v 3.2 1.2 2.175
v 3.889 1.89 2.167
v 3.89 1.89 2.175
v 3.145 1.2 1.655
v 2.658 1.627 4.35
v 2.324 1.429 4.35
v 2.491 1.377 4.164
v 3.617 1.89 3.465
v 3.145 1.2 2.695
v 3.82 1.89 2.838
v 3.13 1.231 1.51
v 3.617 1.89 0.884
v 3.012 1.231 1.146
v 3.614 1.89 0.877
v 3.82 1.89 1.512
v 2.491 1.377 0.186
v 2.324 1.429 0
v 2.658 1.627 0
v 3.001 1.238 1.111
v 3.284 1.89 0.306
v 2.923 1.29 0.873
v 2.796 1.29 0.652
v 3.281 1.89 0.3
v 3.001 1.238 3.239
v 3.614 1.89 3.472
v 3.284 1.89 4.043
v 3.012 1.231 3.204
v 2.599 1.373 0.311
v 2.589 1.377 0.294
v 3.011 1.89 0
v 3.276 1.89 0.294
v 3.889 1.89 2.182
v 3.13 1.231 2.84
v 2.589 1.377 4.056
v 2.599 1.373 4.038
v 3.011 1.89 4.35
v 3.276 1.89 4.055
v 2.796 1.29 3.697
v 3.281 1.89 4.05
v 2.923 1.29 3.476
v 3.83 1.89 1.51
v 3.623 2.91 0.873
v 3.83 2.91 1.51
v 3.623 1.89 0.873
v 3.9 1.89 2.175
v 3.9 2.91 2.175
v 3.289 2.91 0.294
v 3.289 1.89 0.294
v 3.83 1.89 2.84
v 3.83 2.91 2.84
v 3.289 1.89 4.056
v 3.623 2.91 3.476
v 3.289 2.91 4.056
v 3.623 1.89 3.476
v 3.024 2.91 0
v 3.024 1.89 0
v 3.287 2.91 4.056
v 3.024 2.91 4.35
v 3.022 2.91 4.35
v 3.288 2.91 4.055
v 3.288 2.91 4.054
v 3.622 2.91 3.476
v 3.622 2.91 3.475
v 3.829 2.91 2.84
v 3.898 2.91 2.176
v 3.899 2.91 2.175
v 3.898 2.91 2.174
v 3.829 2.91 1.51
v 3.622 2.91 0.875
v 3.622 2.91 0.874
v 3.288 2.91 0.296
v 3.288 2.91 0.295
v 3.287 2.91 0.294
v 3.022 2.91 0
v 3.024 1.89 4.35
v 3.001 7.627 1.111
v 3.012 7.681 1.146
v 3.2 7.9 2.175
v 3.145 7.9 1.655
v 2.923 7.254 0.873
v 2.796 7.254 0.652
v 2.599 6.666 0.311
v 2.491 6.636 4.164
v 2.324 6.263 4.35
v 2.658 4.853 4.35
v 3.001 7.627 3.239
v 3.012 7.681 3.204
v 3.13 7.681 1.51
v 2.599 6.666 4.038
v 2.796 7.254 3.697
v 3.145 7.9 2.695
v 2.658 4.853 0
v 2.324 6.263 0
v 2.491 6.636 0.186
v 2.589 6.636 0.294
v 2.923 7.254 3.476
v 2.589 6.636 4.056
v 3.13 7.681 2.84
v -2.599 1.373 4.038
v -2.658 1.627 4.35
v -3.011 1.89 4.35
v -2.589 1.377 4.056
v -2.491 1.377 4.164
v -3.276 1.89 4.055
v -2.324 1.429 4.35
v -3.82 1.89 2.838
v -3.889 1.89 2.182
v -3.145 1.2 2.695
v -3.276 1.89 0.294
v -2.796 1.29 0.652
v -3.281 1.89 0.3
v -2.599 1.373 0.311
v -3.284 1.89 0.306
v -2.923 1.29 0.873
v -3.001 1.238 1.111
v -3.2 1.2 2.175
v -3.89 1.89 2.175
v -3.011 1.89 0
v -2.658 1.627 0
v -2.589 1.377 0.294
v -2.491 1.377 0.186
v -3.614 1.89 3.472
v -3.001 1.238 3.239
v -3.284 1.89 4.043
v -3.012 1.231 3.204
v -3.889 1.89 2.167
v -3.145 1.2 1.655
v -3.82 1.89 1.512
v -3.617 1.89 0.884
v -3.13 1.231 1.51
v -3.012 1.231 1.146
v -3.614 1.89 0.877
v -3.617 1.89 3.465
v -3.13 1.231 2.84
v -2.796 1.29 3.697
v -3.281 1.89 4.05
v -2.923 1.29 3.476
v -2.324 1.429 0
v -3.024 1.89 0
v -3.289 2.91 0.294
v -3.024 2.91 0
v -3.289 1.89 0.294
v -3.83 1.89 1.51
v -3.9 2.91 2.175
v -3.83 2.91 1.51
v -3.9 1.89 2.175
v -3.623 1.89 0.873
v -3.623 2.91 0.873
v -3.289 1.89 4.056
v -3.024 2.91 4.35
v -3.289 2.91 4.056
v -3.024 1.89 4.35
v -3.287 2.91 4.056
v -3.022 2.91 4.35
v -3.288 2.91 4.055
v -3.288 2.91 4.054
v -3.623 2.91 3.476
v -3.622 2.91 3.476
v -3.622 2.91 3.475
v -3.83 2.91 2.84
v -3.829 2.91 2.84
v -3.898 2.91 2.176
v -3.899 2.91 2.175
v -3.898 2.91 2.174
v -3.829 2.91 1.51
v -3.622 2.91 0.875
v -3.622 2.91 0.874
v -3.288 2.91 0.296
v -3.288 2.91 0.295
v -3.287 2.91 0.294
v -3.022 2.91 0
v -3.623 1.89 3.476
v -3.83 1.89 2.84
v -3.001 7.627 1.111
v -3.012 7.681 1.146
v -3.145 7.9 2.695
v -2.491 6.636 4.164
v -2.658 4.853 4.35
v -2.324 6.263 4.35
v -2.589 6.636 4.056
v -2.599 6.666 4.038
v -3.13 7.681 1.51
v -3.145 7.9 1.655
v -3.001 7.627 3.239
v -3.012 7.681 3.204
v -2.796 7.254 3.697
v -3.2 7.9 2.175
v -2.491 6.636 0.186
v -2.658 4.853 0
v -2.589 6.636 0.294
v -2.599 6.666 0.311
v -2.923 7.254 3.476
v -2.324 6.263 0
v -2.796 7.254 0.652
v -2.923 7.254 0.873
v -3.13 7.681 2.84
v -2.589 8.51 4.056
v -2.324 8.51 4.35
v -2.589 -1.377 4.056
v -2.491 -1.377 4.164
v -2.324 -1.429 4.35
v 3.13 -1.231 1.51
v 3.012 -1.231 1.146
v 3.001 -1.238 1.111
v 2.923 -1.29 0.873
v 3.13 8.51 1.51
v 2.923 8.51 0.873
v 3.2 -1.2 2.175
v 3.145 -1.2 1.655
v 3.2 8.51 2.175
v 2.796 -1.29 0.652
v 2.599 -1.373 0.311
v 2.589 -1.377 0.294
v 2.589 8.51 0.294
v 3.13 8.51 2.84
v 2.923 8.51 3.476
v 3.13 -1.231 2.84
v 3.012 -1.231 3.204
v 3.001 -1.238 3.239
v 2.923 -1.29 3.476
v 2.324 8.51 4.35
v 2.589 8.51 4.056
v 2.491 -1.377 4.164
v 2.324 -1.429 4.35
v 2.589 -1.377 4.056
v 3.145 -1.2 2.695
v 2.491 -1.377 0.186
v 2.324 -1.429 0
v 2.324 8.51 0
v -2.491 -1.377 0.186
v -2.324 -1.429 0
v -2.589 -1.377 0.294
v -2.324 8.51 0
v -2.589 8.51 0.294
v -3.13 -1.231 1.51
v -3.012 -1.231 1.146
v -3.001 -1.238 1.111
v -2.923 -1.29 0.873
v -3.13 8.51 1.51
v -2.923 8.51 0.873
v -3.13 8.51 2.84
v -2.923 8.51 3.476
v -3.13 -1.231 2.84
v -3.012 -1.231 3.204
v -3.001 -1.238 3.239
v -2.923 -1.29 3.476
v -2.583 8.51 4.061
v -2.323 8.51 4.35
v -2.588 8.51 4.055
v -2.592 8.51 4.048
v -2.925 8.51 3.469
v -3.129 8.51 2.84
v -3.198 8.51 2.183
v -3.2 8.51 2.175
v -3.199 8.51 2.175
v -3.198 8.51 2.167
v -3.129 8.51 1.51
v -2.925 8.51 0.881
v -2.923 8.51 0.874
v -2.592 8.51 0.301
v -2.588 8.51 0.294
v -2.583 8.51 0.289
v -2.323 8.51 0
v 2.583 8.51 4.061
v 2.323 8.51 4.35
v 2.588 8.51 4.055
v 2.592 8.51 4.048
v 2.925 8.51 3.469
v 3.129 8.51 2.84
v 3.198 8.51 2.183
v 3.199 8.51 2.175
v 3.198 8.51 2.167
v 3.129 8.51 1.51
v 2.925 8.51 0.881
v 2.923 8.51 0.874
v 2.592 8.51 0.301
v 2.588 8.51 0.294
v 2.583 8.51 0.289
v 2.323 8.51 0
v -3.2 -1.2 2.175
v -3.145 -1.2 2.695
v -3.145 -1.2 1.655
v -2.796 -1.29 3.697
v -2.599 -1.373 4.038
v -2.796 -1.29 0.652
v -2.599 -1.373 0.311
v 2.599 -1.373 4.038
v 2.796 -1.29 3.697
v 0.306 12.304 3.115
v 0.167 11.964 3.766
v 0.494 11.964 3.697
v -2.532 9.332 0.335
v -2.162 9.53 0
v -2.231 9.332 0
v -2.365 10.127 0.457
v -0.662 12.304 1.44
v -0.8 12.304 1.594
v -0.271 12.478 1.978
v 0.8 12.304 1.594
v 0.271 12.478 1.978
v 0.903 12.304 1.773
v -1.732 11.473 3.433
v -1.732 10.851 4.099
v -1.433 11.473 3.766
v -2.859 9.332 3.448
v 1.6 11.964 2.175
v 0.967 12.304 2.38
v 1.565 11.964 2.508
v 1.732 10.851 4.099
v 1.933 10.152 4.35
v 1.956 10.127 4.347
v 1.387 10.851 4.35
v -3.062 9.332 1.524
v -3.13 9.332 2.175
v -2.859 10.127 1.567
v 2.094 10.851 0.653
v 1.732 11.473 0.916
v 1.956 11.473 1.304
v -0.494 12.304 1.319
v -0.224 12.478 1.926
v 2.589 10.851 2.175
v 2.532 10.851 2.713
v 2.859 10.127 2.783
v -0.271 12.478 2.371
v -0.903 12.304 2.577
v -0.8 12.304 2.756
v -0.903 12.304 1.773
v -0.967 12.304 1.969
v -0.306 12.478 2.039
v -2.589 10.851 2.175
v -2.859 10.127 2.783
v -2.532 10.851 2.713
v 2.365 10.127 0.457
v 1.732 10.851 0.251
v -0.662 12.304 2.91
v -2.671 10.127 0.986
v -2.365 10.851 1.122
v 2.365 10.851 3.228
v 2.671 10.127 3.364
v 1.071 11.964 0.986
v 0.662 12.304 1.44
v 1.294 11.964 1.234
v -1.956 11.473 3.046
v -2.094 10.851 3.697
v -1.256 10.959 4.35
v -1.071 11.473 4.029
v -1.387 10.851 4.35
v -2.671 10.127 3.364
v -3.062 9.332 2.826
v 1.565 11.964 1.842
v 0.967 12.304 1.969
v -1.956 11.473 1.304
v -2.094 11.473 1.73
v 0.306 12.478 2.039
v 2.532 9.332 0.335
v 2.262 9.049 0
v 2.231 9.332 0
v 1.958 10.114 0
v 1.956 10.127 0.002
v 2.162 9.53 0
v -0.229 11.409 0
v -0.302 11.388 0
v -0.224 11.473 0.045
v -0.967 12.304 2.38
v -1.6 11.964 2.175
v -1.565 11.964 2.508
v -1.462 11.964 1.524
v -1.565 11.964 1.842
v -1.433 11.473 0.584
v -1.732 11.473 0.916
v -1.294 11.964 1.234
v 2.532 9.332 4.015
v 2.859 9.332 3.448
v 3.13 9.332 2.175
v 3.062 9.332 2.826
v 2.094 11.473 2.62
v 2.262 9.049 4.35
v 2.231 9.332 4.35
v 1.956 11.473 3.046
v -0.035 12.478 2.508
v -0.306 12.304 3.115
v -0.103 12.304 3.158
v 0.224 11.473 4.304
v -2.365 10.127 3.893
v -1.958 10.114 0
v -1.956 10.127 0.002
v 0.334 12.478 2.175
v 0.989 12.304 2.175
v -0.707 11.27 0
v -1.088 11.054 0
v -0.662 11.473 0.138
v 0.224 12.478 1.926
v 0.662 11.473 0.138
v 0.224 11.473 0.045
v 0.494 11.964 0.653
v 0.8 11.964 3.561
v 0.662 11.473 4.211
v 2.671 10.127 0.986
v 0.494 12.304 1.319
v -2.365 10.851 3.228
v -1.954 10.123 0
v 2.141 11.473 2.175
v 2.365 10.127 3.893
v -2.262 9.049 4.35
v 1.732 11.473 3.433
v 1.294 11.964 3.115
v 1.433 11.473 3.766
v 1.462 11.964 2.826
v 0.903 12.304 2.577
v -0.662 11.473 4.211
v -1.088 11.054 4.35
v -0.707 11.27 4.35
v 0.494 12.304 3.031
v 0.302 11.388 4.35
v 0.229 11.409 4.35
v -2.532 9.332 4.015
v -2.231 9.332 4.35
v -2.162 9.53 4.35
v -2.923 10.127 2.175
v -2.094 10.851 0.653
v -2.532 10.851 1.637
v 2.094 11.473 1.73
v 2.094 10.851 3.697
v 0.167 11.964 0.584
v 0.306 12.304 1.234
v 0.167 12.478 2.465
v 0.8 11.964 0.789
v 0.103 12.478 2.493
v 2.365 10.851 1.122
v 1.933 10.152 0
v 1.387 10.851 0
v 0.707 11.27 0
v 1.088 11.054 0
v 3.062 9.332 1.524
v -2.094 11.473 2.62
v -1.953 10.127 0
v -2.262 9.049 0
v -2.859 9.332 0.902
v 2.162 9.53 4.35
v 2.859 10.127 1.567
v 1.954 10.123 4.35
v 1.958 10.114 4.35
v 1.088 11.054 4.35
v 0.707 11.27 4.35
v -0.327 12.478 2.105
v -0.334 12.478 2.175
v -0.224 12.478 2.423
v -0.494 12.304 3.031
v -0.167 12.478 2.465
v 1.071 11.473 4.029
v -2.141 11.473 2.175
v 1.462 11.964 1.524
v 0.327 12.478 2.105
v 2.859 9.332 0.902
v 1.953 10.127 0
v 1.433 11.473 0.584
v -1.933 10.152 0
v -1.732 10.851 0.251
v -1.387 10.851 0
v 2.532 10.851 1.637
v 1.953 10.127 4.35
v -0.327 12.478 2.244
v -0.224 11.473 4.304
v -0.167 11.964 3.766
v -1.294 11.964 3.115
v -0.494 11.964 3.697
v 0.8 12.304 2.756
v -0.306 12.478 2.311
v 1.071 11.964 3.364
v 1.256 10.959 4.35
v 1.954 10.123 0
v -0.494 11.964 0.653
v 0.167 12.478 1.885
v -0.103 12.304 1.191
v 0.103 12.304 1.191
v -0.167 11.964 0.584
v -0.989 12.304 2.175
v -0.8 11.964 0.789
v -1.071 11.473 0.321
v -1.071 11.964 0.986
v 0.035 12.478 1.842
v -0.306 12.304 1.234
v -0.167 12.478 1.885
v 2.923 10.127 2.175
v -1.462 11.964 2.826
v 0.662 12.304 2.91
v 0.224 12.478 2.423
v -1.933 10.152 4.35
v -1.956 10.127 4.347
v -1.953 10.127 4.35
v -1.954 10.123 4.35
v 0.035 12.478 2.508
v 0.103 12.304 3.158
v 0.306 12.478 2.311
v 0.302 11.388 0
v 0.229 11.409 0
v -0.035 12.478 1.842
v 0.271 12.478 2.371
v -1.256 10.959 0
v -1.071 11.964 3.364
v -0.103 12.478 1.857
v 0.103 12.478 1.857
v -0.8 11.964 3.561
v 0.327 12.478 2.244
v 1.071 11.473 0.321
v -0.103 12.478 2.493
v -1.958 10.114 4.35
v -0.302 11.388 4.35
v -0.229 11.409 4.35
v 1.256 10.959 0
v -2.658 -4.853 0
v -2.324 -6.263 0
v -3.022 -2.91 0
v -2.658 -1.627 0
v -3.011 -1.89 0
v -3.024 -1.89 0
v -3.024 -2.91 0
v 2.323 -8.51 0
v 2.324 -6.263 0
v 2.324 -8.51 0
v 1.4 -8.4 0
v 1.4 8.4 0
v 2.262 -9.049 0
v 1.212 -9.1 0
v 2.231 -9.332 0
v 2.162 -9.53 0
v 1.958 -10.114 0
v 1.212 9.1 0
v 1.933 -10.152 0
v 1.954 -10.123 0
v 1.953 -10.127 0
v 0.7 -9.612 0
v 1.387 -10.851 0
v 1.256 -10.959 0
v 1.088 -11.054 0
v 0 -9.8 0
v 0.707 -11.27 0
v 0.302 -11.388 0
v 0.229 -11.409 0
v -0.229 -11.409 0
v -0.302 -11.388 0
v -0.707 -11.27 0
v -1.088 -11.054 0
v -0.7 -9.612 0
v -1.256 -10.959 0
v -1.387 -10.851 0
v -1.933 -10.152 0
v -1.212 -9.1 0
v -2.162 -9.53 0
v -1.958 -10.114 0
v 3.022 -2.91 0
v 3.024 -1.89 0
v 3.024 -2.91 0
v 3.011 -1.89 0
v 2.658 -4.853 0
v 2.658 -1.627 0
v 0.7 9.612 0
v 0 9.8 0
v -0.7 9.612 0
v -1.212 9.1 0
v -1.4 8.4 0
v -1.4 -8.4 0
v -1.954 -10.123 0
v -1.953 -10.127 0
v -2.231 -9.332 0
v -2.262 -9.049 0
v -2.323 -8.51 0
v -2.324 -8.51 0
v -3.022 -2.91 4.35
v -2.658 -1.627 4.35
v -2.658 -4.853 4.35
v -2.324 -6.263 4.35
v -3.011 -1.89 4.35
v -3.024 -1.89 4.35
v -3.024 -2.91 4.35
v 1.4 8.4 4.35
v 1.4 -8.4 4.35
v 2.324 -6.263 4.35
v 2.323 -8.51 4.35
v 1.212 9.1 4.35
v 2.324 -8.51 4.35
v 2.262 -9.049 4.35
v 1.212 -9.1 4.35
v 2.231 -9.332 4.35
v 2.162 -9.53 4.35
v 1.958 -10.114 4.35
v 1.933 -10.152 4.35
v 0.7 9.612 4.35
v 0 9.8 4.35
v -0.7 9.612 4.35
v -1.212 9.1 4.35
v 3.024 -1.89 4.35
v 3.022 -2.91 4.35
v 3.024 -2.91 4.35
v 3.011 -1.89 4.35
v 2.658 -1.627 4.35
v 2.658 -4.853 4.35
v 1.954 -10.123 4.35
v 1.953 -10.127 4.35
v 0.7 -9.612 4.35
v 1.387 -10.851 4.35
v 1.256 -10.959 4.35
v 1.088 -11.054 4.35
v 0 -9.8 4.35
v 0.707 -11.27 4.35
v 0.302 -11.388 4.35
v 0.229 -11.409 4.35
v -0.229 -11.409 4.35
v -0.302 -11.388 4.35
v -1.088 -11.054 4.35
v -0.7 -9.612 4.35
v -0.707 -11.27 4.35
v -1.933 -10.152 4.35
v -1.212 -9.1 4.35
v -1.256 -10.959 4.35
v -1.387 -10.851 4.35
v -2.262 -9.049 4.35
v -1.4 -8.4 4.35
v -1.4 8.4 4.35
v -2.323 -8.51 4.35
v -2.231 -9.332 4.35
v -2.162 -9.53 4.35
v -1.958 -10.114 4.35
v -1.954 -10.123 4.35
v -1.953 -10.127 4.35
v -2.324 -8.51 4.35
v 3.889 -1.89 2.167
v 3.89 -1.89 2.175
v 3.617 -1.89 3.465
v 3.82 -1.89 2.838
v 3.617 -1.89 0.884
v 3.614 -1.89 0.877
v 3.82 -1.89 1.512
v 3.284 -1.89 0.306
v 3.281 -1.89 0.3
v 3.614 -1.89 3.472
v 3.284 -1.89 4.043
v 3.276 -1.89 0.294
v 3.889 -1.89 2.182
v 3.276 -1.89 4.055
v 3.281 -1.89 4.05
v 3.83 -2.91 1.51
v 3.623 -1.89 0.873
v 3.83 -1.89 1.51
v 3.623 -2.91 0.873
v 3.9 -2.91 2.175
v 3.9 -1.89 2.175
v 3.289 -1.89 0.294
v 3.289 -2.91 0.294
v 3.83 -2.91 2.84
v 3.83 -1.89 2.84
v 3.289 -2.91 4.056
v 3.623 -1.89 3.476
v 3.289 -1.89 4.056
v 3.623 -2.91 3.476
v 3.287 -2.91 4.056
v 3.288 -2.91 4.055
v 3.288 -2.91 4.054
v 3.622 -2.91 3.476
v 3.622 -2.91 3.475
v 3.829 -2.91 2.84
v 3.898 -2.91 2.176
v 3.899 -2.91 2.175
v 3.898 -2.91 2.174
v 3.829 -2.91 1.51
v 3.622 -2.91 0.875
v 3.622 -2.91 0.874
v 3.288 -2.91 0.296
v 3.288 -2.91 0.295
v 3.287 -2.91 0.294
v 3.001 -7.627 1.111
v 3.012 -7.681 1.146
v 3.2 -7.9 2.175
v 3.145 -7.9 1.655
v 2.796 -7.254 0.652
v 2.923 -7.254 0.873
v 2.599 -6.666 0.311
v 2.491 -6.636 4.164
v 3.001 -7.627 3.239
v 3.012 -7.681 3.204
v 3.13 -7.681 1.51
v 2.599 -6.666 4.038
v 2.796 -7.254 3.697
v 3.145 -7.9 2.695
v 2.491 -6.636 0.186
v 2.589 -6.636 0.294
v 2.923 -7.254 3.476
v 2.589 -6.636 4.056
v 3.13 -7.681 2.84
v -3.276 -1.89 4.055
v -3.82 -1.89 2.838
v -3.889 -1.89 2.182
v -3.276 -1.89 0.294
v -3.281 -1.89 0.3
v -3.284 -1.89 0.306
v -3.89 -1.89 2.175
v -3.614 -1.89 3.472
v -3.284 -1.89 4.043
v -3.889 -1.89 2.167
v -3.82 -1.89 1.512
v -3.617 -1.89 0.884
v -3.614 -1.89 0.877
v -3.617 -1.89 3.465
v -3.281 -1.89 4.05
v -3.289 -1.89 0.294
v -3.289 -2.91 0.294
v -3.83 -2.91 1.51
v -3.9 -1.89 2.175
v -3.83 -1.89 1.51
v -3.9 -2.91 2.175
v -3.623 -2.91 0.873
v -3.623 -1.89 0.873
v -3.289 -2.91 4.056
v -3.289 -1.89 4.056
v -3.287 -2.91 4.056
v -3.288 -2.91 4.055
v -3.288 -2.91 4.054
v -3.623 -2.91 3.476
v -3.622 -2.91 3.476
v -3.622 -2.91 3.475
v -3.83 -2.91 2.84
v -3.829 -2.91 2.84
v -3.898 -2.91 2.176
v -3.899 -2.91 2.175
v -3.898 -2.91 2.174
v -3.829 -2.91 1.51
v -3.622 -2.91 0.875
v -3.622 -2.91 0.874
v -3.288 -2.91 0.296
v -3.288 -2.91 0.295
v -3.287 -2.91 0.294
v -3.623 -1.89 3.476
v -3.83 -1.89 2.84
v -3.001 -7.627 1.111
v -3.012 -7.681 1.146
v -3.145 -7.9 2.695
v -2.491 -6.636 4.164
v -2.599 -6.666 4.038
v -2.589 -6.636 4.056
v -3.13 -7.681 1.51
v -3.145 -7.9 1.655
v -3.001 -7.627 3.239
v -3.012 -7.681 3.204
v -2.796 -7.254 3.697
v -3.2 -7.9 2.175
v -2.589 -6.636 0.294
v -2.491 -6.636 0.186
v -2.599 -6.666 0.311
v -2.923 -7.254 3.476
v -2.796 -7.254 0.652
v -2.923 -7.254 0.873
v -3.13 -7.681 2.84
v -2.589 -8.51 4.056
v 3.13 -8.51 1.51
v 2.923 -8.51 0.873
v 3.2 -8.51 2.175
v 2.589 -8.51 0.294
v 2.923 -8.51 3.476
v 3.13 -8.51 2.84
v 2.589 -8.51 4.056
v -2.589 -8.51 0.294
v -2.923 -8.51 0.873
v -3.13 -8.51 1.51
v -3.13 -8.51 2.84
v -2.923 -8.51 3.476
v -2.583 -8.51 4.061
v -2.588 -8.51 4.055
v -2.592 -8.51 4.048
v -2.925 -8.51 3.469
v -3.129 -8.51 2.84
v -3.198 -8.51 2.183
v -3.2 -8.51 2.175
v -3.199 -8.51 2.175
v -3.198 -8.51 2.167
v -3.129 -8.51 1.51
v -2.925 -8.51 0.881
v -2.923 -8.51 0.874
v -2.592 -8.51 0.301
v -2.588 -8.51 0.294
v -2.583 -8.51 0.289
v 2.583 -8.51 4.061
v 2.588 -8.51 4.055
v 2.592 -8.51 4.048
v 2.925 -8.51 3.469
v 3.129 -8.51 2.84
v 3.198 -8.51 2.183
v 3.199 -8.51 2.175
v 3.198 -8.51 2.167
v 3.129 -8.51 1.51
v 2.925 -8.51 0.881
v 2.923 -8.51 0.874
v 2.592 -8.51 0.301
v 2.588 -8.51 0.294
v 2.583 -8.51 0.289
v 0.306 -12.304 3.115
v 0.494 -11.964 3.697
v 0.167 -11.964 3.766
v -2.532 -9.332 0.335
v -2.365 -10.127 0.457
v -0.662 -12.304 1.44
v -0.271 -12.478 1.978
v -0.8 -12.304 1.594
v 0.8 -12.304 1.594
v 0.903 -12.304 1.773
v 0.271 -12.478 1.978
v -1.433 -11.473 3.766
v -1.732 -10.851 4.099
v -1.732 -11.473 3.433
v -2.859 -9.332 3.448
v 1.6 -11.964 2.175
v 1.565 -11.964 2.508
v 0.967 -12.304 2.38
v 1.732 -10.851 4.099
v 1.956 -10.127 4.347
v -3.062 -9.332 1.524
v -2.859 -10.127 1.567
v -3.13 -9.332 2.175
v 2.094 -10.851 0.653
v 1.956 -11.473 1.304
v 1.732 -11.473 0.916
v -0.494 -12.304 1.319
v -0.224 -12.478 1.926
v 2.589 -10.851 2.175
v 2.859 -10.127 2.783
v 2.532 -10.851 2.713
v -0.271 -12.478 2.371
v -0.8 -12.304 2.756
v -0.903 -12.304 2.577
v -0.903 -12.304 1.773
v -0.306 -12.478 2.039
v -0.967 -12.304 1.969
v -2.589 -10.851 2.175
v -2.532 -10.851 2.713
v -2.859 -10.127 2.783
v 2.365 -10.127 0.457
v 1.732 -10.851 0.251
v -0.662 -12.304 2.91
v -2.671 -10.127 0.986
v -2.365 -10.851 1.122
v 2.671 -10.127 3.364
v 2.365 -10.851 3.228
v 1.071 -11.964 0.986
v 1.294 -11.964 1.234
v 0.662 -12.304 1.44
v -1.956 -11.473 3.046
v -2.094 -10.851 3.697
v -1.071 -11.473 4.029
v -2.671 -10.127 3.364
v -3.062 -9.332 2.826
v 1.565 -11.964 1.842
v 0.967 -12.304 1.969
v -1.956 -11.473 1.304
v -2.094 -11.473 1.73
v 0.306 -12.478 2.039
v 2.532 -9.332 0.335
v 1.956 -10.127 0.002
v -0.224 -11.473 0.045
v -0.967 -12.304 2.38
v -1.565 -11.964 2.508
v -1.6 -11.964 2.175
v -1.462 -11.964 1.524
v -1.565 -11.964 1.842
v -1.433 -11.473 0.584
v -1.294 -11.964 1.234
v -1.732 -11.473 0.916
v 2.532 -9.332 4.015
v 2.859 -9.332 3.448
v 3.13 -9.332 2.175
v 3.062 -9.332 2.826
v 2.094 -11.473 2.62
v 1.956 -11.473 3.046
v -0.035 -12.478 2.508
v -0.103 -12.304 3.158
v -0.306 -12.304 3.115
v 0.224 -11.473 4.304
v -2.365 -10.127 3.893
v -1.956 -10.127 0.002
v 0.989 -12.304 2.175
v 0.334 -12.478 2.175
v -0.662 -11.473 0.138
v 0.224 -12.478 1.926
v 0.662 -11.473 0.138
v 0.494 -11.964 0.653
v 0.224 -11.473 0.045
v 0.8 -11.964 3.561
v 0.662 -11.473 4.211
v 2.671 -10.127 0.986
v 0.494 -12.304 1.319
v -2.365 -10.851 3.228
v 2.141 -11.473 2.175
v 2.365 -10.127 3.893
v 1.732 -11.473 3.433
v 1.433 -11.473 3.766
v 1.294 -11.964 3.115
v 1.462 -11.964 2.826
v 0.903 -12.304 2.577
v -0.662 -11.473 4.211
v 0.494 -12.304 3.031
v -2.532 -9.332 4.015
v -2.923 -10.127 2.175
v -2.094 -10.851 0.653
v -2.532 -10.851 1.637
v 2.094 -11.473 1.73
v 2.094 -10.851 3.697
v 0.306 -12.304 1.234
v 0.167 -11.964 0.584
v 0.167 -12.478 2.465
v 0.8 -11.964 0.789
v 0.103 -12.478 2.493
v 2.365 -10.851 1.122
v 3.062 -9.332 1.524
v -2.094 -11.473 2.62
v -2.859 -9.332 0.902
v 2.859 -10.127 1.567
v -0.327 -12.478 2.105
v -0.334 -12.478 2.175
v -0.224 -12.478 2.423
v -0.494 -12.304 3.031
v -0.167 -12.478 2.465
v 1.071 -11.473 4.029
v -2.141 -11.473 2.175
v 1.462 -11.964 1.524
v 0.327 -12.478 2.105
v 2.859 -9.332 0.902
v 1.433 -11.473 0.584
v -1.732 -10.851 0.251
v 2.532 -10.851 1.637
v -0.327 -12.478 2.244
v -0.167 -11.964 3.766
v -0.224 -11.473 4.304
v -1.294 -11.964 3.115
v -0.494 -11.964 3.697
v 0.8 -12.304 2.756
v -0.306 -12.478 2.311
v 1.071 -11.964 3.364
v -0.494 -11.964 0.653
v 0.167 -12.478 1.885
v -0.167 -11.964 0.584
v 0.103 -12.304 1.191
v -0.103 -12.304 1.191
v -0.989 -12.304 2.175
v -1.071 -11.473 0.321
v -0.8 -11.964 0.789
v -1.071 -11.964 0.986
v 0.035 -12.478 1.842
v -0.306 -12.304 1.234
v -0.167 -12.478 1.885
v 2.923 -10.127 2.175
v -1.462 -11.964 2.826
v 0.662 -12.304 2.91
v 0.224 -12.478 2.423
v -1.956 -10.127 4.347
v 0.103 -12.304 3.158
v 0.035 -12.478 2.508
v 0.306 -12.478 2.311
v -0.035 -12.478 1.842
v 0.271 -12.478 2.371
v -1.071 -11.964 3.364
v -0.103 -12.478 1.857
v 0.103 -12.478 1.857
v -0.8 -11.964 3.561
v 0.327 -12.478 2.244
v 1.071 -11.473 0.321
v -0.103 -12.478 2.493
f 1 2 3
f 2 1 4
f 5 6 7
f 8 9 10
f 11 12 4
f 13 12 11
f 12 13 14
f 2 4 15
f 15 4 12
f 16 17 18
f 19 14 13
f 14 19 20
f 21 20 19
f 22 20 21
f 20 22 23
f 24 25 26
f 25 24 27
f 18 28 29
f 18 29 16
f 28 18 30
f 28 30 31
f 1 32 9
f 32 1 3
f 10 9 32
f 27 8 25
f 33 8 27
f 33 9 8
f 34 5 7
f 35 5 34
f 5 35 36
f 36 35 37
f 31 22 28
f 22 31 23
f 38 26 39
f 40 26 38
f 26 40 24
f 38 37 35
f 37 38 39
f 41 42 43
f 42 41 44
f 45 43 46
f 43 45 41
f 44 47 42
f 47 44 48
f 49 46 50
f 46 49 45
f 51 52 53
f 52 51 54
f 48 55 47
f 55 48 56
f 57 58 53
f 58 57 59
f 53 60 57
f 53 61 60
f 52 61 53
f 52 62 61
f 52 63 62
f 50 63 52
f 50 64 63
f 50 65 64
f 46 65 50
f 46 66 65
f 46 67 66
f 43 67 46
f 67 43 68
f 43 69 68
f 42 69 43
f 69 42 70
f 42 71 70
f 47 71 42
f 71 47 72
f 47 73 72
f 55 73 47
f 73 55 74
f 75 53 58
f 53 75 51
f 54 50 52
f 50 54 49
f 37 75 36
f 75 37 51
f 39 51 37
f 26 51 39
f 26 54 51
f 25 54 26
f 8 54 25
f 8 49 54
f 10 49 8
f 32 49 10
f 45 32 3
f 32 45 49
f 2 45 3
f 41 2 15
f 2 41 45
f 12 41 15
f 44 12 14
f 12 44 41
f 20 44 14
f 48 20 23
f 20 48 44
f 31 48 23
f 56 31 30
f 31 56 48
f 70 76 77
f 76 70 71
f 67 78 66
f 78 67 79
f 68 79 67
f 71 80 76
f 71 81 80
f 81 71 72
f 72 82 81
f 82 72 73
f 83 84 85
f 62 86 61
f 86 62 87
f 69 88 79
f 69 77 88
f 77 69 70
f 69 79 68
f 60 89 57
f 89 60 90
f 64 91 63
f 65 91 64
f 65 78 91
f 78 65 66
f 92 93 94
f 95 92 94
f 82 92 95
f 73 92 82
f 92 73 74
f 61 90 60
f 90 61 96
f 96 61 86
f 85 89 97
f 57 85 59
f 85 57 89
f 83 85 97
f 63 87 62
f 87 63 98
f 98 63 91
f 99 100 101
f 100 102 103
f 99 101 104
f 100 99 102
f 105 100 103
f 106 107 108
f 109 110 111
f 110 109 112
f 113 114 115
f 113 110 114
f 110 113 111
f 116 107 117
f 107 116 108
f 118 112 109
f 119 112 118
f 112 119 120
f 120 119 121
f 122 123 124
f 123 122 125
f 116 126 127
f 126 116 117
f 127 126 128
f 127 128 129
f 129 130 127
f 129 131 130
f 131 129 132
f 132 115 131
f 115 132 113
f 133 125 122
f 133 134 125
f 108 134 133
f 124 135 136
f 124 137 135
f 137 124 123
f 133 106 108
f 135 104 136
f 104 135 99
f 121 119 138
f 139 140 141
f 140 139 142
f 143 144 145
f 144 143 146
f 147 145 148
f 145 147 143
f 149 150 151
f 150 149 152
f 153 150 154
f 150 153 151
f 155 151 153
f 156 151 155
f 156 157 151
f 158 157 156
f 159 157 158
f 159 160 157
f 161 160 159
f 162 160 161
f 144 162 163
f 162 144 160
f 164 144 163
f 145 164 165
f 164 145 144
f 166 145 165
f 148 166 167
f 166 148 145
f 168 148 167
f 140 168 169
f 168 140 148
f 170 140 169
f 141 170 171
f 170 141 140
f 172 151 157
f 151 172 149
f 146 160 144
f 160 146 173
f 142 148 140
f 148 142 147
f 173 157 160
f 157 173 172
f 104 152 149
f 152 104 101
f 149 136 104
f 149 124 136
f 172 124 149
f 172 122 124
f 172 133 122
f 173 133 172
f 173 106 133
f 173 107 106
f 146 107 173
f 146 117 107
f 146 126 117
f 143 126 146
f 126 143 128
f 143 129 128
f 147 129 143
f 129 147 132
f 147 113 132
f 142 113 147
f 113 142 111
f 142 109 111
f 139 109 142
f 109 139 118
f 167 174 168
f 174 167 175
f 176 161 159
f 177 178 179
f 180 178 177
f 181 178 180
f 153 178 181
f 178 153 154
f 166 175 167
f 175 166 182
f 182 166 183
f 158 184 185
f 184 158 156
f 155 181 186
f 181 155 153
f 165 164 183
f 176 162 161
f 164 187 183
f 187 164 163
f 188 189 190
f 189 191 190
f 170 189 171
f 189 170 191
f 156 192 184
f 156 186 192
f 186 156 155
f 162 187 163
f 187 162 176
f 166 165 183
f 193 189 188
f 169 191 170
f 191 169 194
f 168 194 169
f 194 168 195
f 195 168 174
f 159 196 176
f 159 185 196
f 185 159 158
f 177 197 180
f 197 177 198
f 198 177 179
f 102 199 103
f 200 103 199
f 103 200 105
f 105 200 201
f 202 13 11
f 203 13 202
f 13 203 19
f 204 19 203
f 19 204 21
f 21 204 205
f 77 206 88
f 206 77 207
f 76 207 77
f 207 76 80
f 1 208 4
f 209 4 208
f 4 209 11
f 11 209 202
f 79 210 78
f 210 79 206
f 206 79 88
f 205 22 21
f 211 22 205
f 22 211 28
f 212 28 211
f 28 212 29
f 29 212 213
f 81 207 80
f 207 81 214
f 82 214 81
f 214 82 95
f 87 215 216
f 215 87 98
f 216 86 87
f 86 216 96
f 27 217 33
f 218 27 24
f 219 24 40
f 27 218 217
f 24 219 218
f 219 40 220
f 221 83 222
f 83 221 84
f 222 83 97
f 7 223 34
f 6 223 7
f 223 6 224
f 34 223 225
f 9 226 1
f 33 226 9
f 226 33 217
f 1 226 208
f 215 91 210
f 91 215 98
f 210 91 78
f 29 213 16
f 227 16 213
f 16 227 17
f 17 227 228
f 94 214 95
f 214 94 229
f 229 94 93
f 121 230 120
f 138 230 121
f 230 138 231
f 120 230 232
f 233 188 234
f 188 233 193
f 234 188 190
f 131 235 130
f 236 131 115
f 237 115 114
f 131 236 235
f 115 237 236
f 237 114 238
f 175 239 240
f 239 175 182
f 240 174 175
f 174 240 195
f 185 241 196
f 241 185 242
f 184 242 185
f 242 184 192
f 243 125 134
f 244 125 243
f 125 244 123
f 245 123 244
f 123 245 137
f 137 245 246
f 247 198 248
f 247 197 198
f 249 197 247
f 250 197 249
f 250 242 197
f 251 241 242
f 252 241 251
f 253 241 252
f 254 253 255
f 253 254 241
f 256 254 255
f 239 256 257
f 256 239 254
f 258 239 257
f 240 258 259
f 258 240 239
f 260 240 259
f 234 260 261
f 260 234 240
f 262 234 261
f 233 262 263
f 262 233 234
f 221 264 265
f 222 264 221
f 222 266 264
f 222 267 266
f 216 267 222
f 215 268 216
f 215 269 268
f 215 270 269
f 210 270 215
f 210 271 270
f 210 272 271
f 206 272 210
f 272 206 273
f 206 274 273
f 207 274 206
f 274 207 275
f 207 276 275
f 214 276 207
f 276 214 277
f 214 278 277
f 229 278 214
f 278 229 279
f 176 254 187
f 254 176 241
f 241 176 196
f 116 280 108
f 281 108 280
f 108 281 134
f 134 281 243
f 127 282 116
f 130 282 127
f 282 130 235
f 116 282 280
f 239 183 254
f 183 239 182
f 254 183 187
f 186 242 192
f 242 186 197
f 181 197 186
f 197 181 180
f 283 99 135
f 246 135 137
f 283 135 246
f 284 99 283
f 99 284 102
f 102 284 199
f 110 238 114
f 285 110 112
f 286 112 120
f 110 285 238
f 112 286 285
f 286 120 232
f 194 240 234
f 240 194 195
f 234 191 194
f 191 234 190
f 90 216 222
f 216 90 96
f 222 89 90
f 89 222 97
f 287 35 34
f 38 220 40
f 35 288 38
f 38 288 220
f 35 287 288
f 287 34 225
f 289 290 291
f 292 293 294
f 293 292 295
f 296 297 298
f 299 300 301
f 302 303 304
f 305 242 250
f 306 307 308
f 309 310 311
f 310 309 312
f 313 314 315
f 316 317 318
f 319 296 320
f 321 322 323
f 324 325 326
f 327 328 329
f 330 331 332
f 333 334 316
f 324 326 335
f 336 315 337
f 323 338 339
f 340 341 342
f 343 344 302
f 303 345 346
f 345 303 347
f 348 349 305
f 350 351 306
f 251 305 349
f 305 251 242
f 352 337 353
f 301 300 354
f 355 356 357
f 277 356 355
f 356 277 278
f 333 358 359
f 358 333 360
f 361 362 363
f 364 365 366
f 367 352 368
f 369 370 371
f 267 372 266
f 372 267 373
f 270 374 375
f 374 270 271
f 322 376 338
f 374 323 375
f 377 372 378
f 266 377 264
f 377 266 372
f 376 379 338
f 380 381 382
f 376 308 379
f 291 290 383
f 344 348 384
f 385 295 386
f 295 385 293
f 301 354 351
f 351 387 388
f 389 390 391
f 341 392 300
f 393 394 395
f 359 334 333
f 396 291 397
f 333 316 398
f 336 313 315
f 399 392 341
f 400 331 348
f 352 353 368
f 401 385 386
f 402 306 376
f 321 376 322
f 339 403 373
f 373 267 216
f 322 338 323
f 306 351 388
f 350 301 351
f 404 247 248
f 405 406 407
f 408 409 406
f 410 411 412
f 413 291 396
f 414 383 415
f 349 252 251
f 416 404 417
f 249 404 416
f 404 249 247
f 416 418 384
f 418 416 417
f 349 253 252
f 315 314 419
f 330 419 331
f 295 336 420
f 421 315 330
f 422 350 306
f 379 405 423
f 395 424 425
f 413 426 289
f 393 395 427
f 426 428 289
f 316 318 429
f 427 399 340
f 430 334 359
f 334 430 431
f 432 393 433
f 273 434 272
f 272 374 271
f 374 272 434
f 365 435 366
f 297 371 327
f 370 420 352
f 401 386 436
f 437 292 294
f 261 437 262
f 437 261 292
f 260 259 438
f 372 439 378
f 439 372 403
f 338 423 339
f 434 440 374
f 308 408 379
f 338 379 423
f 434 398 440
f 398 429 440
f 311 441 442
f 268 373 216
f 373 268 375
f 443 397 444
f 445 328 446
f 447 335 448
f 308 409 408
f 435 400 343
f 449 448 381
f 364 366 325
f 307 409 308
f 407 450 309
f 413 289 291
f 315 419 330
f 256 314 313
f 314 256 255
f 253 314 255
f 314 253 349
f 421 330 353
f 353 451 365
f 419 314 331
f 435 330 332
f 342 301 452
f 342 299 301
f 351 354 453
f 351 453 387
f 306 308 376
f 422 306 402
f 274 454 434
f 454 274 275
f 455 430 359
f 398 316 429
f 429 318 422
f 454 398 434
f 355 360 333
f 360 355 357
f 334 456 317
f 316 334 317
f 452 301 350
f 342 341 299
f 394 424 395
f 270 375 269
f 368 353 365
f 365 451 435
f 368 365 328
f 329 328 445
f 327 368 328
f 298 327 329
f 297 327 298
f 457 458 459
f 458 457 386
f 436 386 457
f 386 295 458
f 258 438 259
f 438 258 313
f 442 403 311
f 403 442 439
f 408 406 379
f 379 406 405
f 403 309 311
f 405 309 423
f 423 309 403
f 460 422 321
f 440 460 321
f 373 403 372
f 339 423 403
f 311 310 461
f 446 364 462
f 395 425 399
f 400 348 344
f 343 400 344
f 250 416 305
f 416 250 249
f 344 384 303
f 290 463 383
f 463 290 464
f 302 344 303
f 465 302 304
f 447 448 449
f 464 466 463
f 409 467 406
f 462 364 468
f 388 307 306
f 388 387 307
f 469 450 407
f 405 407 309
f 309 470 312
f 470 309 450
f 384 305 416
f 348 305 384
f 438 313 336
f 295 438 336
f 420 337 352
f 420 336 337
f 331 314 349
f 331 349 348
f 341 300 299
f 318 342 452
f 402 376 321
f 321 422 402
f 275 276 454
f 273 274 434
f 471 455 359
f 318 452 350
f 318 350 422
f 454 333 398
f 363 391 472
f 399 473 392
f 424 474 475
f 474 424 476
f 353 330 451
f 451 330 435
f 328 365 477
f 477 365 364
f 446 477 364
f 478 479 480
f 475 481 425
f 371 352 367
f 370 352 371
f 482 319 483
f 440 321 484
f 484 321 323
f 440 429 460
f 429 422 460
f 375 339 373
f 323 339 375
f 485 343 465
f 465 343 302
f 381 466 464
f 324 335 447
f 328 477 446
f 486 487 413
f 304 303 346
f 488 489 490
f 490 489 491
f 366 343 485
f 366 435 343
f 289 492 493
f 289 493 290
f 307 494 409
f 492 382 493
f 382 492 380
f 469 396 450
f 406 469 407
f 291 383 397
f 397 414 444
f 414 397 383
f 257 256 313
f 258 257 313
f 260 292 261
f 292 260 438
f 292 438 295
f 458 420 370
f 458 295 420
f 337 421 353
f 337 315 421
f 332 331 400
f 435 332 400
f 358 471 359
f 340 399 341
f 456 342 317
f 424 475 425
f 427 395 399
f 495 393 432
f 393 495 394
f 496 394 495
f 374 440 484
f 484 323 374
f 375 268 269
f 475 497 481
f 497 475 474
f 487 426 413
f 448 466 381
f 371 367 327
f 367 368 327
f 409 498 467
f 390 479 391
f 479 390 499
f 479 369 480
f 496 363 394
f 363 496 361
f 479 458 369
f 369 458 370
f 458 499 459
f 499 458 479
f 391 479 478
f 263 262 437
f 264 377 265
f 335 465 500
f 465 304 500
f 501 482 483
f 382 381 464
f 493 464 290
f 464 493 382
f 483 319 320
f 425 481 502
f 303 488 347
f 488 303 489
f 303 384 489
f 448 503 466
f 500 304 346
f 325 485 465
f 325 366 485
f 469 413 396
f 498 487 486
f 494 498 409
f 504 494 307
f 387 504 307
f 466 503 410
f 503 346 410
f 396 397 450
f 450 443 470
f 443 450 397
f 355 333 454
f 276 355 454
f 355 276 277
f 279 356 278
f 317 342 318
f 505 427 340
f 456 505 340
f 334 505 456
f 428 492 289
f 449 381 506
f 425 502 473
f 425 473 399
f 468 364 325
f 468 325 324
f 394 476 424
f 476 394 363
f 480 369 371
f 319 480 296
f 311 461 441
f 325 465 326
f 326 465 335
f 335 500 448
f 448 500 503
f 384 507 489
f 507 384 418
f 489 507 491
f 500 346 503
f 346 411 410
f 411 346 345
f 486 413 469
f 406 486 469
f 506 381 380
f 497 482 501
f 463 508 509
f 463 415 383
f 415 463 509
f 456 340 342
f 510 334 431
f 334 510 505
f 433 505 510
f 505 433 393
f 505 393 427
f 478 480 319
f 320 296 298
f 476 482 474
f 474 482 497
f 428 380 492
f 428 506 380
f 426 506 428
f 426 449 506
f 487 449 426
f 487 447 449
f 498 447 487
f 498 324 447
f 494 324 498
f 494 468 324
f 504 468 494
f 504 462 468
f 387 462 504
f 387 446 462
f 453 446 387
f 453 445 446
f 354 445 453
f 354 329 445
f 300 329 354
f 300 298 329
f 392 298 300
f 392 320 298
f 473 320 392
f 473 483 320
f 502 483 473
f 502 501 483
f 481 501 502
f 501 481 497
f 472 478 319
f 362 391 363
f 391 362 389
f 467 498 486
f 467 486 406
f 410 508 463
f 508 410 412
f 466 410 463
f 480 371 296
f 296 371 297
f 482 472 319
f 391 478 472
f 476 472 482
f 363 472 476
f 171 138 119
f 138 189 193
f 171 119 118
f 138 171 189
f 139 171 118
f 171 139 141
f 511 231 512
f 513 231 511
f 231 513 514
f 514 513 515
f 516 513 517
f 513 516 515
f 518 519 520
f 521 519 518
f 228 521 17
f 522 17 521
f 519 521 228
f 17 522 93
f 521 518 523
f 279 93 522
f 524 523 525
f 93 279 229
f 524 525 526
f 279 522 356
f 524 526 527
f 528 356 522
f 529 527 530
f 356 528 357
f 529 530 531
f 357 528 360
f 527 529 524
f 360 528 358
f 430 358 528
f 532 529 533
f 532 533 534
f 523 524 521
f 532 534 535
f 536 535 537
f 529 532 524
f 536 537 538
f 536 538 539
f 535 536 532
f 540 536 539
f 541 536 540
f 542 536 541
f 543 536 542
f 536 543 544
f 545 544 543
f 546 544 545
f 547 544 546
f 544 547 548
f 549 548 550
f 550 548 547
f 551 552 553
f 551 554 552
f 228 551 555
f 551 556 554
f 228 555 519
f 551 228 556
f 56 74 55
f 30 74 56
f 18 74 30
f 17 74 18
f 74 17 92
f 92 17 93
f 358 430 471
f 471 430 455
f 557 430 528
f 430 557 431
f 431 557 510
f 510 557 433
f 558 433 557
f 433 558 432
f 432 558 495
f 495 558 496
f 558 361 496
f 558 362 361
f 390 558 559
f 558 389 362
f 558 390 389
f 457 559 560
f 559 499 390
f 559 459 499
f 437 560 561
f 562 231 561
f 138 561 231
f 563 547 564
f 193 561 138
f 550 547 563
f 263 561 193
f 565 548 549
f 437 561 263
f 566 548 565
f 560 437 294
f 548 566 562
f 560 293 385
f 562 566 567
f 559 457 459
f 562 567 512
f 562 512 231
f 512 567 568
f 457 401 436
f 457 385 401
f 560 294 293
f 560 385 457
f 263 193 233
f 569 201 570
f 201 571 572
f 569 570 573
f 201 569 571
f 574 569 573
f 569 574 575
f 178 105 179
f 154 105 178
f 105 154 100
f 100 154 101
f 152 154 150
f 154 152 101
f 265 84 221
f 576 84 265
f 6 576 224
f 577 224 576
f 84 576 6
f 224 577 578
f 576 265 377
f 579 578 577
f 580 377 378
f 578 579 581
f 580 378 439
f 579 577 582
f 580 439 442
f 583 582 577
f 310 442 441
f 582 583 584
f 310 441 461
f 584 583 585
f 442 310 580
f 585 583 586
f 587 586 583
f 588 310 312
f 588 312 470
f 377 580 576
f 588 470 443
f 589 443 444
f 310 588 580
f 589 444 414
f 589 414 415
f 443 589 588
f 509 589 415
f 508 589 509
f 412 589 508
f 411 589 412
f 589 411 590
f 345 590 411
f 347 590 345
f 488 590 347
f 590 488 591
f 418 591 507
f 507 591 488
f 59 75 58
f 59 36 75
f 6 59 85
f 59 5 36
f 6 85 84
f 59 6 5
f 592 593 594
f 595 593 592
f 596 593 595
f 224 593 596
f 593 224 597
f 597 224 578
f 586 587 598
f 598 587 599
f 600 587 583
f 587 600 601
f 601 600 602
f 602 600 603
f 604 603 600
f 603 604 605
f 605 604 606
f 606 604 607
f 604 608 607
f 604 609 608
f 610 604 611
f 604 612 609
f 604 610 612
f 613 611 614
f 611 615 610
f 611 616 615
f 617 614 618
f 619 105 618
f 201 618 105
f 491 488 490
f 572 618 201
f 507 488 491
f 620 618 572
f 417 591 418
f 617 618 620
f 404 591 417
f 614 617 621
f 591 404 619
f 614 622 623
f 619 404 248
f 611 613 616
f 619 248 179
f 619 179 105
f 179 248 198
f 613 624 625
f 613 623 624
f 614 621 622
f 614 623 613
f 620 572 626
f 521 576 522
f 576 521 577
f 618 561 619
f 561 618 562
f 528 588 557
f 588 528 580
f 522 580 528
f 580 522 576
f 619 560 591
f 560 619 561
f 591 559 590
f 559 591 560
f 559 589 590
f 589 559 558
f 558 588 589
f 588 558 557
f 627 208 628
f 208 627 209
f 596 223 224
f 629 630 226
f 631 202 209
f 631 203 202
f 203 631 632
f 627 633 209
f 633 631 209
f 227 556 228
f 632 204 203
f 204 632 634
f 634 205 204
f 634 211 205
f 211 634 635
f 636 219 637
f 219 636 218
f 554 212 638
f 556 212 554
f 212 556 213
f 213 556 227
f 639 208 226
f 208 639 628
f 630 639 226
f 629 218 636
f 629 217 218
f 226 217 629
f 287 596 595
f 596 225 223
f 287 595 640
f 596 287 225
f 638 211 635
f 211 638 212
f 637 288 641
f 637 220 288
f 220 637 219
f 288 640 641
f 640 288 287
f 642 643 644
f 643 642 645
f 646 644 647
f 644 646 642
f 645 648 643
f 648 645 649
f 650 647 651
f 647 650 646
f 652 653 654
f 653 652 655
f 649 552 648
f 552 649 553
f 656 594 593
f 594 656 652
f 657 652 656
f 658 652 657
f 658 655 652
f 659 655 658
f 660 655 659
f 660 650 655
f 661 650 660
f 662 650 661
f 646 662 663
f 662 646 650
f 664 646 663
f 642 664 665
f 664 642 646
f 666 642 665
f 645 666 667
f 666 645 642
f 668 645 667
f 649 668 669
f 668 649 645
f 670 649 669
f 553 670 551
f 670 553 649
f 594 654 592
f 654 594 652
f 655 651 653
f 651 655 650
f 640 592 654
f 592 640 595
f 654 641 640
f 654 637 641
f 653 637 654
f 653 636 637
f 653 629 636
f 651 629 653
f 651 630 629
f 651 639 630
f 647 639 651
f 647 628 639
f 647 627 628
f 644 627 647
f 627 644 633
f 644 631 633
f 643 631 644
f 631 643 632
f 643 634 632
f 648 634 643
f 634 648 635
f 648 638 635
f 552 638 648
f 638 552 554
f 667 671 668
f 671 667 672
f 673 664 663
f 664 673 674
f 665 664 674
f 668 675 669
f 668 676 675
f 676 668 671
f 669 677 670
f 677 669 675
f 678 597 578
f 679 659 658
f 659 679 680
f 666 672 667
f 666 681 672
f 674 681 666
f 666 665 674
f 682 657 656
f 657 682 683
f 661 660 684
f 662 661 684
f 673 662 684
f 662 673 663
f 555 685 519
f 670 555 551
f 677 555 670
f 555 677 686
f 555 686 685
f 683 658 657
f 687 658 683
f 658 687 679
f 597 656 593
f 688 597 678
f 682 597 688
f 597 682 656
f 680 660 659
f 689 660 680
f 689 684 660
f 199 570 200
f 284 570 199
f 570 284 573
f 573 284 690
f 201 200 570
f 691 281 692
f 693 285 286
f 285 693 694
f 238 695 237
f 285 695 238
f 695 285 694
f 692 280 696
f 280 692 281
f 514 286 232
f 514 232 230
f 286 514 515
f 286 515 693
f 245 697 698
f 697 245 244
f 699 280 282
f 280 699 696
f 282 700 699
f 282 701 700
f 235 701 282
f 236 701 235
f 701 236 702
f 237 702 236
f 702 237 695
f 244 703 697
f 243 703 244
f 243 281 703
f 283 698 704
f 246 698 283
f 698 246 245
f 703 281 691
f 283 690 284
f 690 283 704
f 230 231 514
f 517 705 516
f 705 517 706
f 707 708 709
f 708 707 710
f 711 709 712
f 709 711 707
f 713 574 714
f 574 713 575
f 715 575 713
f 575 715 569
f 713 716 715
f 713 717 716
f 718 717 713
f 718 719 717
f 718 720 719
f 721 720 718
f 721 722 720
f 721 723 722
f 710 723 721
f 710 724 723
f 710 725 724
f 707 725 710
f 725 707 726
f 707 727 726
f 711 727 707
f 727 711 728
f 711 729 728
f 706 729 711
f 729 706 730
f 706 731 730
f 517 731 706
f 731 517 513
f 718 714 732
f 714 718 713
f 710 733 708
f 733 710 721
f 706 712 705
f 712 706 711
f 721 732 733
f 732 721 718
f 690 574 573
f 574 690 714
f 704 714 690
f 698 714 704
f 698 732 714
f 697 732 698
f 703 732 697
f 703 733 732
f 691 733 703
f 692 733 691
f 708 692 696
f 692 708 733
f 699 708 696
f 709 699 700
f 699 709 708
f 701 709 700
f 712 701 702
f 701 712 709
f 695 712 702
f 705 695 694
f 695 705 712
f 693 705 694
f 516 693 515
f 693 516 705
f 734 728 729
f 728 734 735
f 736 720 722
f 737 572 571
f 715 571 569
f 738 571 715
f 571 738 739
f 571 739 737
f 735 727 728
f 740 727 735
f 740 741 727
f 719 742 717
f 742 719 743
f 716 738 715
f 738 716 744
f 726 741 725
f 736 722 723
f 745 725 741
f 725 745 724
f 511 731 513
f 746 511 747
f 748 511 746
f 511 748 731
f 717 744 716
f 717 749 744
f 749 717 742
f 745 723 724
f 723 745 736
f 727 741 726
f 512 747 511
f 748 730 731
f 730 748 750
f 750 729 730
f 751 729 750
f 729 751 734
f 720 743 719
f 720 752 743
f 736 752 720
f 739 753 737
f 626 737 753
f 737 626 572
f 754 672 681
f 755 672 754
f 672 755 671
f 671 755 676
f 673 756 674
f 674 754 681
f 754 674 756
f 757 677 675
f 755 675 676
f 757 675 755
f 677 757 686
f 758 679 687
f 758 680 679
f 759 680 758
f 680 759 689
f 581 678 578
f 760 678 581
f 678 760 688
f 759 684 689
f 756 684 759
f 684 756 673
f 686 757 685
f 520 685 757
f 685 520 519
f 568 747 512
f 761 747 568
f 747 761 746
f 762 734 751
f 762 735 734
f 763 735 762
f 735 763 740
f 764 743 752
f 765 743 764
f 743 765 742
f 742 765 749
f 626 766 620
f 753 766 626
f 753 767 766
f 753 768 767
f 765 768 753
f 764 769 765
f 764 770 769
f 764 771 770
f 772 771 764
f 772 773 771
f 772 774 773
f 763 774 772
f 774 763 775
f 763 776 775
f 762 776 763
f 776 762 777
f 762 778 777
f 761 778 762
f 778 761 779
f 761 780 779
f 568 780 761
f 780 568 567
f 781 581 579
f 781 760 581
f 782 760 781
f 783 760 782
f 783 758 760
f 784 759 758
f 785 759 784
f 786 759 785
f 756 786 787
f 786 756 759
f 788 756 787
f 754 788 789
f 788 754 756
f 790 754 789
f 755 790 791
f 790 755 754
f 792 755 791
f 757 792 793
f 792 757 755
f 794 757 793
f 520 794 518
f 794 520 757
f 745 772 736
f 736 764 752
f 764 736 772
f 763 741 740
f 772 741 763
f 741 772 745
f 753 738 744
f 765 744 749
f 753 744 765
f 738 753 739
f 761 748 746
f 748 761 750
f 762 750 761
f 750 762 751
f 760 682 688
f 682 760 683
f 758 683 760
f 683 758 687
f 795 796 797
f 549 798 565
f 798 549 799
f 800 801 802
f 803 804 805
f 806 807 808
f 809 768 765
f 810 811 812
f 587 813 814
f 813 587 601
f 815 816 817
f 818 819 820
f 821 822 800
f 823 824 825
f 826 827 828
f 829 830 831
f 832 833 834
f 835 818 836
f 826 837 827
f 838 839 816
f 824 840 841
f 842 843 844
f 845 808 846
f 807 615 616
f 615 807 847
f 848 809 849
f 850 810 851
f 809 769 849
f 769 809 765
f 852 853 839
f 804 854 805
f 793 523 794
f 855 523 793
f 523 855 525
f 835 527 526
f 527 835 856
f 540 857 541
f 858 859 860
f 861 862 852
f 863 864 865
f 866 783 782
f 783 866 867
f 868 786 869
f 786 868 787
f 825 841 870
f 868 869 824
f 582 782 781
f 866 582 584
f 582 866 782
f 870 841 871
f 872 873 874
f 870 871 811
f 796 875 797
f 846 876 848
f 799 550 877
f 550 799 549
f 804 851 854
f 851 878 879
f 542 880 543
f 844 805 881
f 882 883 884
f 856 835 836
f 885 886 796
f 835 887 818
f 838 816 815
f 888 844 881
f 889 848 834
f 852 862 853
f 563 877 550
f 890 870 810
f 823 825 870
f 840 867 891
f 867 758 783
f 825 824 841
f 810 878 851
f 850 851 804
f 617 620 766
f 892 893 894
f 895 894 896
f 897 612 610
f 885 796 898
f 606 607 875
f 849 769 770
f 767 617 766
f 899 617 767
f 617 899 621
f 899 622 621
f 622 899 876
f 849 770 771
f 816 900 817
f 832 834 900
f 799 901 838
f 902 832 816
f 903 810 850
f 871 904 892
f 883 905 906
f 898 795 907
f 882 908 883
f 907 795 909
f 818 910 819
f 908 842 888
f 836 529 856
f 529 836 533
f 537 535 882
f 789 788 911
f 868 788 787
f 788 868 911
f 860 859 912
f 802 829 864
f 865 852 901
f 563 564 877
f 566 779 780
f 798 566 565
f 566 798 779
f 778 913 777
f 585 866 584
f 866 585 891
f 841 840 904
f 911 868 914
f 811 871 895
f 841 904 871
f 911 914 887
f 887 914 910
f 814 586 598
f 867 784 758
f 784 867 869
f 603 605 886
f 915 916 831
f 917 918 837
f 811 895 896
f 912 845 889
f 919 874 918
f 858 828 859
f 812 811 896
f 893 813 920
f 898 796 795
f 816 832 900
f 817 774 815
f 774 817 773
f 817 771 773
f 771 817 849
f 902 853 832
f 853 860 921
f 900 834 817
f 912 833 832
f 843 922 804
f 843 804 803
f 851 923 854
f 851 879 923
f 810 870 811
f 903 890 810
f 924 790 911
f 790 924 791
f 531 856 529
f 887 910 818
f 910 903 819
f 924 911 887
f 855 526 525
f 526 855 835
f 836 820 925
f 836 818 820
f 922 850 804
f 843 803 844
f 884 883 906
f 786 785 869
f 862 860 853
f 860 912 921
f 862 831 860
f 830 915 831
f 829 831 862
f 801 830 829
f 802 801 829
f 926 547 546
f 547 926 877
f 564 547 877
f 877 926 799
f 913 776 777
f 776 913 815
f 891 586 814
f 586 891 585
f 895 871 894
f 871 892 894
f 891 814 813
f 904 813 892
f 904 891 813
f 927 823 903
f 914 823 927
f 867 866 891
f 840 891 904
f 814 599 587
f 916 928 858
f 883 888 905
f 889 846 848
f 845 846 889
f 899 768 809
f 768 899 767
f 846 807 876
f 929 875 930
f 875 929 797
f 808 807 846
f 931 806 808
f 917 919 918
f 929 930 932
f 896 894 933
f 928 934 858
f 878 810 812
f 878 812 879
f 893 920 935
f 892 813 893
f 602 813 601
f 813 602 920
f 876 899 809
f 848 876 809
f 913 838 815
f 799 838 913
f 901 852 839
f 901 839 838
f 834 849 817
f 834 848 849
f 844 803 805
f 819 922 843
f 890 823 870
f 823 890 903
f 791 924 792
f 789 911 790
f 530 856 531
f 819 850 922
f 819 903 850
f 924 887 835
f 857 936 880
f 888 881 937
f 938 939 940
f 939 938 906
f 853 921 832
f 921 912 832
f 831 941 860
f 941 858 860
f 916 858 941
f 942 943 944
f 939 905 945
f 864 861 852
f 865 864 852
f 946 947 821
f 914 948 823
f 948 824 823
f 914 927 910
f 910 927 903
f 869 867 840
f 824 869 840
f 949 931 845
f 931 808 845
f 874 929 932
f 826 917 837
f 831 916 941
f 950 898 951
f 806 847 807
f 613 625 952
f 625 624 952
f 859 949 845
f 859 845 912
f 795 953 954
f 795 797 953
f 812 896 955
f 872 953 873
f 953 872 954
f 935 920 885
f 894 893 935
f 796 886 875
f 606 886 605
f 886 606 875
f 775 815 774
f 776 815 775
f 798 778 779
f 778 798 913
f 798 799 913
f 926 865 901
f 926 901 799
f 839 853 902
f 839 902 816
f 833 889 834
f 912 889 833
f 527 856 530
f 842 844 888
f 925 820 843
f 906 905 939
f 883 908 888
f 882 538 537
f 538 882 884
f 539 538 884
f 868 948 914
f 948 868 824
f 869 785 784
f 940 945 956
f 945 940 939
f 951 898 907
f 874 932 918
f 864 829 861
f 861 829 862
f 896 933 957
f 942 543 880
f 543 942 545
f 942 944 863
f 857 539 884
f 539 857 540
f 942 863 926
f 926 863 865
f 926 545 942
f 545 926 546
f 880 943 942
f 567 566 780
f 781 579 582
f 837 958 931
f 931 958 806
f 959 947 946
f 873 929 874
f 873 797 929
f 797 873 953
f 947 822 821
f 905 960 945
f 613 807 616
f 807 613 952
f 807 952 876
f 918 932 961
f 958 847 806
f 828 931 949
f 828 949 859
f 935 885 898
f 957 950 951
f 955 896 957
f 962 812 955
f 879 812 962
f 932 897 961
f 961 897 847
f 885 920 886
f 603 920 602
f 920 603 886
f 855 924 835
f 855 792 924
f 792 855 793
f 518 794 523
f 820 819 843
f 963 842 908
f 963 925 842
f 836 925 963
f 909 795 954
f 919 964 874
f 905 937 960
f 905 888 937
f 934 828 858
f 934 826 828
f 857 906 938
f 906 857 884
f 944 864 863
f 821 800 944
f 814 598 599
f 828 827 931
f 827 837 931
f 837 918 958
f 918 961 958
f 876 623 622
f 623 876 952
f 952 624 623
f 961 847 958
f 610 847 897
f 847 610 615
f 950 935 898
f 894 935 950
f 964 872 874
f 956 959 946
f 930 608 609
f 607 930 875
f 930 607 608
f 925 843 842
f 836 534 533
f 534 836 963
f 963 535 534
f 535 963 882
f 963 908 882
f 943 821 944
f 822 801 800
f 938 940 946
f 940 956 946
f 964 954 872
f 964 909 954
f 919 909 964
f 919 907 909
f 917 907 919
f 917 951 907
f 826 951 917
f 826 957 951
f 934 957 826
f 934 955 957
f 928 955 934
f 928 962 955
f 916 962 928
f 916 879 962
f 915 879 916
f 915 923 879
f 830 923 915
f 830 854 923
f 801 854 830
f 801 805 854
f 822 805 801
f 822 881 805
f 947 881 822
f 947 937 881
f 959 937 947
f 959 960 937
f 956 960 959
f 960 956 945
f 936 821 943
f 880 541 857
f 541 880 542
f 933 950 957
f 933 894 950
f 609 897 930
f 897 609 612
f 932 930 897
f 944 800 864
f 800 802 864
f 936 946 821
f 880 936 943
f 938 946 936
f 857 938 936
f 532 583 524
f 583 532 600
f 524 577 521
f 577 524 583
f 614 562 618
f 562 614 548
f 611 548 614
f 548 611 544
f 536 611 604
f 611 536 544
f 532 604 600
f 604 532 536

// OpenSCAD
// new pin connectors

object=0;//[0:Pinpeg,1:Pinhole]
//Pinpeg is twice this length
length=13;
//Of hole; pinpeg is smaller to fit
diameter=7;
//Only affects pinhole
hole_twist=0;//[0:free,1:fixed]
//Pulls the snaps together on the pinpeg to ensure a tight coupling
preload=0.1;
//Allows pins to fit easily into holes
clearance=0.3;
//Thicker makes the pinpeg stiffer
thickness=1.8;
//Height of snap nubs
snap=0.4;
//Put fins on pinhole to help with printing strength
fins=1;//[1:yes,0:no]

$fn=30;

//if(object==0)
    pinpeg(r=diameter/2,l=length,d=2.5-preload,nub=snap,t=thickness,space=clearance);
//if(object==1)
    %pinhole(r=diameter/2,l=length,nub=snap,fixed=hole_twist,fins=fins);

//pin(flat=0);
//%pinhole(fixed=true);

//pinpeg();
//translate([10,0,0])difference(){
//	cylinder(r=5.5,h=14);
//	pinhole(fixed=true);
//}
//translate([-10,0,0])difference(){
//	cylinder(r=5.5,h=14);
//	pinhole(fixed=false);
//}

module pin(r=3.5,l=13,d=2.4,slot=10,nub=0.4,t=1.8,space=0.3,flat=1)
translate(flat*[0,0,r/sqrt(2)-space])rotate((1-flat)*[90,0,0])
difference(){
	rotate([-90,0,0])intersection(){
		union(){
			translate([0,0,-0.01])cylinder(r=r-space,h=l-r-0.98);
            //translate([0,0,l-r-1])cylinder(r1=r-space,r2=0,h=r-space/2+1);
            translate([0,0,l-r-1])scale([1,1,1.25]) sphere(r=r-space);
			translate([nub+space,0,d])nub(r-space,nub+space);
			translate([-nub-space,0,d])nub(r-space,nub+space);
		}
		cube([3*r,r*sqrt(2)-2*space,2*l+3*r],center=true);
	}
	translate([0,d,0])cube([2*(r-t-space),slot+2,2*r],center=true);
	translate([0,d-slot/2-1,0])cylinder(r=r-t-space,h=2*r,center=true,$fn=12);
	translate([0,d+slot/2+1,0])cylinder(r=r-t-space,h=2*r,center=true,$fn=12);
}

module nub(r,nub)
union(){
	translate([0,0,-nub-0.5])cylinder(r1=r-nub,r2=r,h=nub);
	cylinder(r=r,h=1.02,center=true);
	translate([0,0,0.5])cylinder(r1=r,r2=r-nub,h=5);
}

module pinhole(r=3.5,l=13,d=2.5,nub=0.4,fixed=false,fins=true)
intersection(){
	union(){
		translate([0,0,-0.1])cylinder(r=r,h=l-r+0.1);
		//translate([0,0,l-r-0.01])cylinder(r1=r,r2=0,h=r);
		translate([0,0,l-r-1]) scale([1,1,1.25]) sphere(r=r);
        translate([0,0,d])nub(r+nub,nub);
		if(fins)translate([0,0,l-r]){
			cube([2*r,0.01,2*r],center=true);
			cube([0.01,2*r,2*r],center=true);
		}
	}
	if(fixed)cube([3*r,r*sqrt(2),2*l+3*r],center=true);
}

module pinpeg(r=3.5,l=13,d=2.4,nub=0.4,t=1.8,space=0.3)
union(){
	pin(r=r,l=l,d=d,nub=nub,t=t,space=space,flat=1);
	mirror([0,1,0])pin(r=r,l=l,d=d,nub=nub,t=t,space=space,flat=1);
}
